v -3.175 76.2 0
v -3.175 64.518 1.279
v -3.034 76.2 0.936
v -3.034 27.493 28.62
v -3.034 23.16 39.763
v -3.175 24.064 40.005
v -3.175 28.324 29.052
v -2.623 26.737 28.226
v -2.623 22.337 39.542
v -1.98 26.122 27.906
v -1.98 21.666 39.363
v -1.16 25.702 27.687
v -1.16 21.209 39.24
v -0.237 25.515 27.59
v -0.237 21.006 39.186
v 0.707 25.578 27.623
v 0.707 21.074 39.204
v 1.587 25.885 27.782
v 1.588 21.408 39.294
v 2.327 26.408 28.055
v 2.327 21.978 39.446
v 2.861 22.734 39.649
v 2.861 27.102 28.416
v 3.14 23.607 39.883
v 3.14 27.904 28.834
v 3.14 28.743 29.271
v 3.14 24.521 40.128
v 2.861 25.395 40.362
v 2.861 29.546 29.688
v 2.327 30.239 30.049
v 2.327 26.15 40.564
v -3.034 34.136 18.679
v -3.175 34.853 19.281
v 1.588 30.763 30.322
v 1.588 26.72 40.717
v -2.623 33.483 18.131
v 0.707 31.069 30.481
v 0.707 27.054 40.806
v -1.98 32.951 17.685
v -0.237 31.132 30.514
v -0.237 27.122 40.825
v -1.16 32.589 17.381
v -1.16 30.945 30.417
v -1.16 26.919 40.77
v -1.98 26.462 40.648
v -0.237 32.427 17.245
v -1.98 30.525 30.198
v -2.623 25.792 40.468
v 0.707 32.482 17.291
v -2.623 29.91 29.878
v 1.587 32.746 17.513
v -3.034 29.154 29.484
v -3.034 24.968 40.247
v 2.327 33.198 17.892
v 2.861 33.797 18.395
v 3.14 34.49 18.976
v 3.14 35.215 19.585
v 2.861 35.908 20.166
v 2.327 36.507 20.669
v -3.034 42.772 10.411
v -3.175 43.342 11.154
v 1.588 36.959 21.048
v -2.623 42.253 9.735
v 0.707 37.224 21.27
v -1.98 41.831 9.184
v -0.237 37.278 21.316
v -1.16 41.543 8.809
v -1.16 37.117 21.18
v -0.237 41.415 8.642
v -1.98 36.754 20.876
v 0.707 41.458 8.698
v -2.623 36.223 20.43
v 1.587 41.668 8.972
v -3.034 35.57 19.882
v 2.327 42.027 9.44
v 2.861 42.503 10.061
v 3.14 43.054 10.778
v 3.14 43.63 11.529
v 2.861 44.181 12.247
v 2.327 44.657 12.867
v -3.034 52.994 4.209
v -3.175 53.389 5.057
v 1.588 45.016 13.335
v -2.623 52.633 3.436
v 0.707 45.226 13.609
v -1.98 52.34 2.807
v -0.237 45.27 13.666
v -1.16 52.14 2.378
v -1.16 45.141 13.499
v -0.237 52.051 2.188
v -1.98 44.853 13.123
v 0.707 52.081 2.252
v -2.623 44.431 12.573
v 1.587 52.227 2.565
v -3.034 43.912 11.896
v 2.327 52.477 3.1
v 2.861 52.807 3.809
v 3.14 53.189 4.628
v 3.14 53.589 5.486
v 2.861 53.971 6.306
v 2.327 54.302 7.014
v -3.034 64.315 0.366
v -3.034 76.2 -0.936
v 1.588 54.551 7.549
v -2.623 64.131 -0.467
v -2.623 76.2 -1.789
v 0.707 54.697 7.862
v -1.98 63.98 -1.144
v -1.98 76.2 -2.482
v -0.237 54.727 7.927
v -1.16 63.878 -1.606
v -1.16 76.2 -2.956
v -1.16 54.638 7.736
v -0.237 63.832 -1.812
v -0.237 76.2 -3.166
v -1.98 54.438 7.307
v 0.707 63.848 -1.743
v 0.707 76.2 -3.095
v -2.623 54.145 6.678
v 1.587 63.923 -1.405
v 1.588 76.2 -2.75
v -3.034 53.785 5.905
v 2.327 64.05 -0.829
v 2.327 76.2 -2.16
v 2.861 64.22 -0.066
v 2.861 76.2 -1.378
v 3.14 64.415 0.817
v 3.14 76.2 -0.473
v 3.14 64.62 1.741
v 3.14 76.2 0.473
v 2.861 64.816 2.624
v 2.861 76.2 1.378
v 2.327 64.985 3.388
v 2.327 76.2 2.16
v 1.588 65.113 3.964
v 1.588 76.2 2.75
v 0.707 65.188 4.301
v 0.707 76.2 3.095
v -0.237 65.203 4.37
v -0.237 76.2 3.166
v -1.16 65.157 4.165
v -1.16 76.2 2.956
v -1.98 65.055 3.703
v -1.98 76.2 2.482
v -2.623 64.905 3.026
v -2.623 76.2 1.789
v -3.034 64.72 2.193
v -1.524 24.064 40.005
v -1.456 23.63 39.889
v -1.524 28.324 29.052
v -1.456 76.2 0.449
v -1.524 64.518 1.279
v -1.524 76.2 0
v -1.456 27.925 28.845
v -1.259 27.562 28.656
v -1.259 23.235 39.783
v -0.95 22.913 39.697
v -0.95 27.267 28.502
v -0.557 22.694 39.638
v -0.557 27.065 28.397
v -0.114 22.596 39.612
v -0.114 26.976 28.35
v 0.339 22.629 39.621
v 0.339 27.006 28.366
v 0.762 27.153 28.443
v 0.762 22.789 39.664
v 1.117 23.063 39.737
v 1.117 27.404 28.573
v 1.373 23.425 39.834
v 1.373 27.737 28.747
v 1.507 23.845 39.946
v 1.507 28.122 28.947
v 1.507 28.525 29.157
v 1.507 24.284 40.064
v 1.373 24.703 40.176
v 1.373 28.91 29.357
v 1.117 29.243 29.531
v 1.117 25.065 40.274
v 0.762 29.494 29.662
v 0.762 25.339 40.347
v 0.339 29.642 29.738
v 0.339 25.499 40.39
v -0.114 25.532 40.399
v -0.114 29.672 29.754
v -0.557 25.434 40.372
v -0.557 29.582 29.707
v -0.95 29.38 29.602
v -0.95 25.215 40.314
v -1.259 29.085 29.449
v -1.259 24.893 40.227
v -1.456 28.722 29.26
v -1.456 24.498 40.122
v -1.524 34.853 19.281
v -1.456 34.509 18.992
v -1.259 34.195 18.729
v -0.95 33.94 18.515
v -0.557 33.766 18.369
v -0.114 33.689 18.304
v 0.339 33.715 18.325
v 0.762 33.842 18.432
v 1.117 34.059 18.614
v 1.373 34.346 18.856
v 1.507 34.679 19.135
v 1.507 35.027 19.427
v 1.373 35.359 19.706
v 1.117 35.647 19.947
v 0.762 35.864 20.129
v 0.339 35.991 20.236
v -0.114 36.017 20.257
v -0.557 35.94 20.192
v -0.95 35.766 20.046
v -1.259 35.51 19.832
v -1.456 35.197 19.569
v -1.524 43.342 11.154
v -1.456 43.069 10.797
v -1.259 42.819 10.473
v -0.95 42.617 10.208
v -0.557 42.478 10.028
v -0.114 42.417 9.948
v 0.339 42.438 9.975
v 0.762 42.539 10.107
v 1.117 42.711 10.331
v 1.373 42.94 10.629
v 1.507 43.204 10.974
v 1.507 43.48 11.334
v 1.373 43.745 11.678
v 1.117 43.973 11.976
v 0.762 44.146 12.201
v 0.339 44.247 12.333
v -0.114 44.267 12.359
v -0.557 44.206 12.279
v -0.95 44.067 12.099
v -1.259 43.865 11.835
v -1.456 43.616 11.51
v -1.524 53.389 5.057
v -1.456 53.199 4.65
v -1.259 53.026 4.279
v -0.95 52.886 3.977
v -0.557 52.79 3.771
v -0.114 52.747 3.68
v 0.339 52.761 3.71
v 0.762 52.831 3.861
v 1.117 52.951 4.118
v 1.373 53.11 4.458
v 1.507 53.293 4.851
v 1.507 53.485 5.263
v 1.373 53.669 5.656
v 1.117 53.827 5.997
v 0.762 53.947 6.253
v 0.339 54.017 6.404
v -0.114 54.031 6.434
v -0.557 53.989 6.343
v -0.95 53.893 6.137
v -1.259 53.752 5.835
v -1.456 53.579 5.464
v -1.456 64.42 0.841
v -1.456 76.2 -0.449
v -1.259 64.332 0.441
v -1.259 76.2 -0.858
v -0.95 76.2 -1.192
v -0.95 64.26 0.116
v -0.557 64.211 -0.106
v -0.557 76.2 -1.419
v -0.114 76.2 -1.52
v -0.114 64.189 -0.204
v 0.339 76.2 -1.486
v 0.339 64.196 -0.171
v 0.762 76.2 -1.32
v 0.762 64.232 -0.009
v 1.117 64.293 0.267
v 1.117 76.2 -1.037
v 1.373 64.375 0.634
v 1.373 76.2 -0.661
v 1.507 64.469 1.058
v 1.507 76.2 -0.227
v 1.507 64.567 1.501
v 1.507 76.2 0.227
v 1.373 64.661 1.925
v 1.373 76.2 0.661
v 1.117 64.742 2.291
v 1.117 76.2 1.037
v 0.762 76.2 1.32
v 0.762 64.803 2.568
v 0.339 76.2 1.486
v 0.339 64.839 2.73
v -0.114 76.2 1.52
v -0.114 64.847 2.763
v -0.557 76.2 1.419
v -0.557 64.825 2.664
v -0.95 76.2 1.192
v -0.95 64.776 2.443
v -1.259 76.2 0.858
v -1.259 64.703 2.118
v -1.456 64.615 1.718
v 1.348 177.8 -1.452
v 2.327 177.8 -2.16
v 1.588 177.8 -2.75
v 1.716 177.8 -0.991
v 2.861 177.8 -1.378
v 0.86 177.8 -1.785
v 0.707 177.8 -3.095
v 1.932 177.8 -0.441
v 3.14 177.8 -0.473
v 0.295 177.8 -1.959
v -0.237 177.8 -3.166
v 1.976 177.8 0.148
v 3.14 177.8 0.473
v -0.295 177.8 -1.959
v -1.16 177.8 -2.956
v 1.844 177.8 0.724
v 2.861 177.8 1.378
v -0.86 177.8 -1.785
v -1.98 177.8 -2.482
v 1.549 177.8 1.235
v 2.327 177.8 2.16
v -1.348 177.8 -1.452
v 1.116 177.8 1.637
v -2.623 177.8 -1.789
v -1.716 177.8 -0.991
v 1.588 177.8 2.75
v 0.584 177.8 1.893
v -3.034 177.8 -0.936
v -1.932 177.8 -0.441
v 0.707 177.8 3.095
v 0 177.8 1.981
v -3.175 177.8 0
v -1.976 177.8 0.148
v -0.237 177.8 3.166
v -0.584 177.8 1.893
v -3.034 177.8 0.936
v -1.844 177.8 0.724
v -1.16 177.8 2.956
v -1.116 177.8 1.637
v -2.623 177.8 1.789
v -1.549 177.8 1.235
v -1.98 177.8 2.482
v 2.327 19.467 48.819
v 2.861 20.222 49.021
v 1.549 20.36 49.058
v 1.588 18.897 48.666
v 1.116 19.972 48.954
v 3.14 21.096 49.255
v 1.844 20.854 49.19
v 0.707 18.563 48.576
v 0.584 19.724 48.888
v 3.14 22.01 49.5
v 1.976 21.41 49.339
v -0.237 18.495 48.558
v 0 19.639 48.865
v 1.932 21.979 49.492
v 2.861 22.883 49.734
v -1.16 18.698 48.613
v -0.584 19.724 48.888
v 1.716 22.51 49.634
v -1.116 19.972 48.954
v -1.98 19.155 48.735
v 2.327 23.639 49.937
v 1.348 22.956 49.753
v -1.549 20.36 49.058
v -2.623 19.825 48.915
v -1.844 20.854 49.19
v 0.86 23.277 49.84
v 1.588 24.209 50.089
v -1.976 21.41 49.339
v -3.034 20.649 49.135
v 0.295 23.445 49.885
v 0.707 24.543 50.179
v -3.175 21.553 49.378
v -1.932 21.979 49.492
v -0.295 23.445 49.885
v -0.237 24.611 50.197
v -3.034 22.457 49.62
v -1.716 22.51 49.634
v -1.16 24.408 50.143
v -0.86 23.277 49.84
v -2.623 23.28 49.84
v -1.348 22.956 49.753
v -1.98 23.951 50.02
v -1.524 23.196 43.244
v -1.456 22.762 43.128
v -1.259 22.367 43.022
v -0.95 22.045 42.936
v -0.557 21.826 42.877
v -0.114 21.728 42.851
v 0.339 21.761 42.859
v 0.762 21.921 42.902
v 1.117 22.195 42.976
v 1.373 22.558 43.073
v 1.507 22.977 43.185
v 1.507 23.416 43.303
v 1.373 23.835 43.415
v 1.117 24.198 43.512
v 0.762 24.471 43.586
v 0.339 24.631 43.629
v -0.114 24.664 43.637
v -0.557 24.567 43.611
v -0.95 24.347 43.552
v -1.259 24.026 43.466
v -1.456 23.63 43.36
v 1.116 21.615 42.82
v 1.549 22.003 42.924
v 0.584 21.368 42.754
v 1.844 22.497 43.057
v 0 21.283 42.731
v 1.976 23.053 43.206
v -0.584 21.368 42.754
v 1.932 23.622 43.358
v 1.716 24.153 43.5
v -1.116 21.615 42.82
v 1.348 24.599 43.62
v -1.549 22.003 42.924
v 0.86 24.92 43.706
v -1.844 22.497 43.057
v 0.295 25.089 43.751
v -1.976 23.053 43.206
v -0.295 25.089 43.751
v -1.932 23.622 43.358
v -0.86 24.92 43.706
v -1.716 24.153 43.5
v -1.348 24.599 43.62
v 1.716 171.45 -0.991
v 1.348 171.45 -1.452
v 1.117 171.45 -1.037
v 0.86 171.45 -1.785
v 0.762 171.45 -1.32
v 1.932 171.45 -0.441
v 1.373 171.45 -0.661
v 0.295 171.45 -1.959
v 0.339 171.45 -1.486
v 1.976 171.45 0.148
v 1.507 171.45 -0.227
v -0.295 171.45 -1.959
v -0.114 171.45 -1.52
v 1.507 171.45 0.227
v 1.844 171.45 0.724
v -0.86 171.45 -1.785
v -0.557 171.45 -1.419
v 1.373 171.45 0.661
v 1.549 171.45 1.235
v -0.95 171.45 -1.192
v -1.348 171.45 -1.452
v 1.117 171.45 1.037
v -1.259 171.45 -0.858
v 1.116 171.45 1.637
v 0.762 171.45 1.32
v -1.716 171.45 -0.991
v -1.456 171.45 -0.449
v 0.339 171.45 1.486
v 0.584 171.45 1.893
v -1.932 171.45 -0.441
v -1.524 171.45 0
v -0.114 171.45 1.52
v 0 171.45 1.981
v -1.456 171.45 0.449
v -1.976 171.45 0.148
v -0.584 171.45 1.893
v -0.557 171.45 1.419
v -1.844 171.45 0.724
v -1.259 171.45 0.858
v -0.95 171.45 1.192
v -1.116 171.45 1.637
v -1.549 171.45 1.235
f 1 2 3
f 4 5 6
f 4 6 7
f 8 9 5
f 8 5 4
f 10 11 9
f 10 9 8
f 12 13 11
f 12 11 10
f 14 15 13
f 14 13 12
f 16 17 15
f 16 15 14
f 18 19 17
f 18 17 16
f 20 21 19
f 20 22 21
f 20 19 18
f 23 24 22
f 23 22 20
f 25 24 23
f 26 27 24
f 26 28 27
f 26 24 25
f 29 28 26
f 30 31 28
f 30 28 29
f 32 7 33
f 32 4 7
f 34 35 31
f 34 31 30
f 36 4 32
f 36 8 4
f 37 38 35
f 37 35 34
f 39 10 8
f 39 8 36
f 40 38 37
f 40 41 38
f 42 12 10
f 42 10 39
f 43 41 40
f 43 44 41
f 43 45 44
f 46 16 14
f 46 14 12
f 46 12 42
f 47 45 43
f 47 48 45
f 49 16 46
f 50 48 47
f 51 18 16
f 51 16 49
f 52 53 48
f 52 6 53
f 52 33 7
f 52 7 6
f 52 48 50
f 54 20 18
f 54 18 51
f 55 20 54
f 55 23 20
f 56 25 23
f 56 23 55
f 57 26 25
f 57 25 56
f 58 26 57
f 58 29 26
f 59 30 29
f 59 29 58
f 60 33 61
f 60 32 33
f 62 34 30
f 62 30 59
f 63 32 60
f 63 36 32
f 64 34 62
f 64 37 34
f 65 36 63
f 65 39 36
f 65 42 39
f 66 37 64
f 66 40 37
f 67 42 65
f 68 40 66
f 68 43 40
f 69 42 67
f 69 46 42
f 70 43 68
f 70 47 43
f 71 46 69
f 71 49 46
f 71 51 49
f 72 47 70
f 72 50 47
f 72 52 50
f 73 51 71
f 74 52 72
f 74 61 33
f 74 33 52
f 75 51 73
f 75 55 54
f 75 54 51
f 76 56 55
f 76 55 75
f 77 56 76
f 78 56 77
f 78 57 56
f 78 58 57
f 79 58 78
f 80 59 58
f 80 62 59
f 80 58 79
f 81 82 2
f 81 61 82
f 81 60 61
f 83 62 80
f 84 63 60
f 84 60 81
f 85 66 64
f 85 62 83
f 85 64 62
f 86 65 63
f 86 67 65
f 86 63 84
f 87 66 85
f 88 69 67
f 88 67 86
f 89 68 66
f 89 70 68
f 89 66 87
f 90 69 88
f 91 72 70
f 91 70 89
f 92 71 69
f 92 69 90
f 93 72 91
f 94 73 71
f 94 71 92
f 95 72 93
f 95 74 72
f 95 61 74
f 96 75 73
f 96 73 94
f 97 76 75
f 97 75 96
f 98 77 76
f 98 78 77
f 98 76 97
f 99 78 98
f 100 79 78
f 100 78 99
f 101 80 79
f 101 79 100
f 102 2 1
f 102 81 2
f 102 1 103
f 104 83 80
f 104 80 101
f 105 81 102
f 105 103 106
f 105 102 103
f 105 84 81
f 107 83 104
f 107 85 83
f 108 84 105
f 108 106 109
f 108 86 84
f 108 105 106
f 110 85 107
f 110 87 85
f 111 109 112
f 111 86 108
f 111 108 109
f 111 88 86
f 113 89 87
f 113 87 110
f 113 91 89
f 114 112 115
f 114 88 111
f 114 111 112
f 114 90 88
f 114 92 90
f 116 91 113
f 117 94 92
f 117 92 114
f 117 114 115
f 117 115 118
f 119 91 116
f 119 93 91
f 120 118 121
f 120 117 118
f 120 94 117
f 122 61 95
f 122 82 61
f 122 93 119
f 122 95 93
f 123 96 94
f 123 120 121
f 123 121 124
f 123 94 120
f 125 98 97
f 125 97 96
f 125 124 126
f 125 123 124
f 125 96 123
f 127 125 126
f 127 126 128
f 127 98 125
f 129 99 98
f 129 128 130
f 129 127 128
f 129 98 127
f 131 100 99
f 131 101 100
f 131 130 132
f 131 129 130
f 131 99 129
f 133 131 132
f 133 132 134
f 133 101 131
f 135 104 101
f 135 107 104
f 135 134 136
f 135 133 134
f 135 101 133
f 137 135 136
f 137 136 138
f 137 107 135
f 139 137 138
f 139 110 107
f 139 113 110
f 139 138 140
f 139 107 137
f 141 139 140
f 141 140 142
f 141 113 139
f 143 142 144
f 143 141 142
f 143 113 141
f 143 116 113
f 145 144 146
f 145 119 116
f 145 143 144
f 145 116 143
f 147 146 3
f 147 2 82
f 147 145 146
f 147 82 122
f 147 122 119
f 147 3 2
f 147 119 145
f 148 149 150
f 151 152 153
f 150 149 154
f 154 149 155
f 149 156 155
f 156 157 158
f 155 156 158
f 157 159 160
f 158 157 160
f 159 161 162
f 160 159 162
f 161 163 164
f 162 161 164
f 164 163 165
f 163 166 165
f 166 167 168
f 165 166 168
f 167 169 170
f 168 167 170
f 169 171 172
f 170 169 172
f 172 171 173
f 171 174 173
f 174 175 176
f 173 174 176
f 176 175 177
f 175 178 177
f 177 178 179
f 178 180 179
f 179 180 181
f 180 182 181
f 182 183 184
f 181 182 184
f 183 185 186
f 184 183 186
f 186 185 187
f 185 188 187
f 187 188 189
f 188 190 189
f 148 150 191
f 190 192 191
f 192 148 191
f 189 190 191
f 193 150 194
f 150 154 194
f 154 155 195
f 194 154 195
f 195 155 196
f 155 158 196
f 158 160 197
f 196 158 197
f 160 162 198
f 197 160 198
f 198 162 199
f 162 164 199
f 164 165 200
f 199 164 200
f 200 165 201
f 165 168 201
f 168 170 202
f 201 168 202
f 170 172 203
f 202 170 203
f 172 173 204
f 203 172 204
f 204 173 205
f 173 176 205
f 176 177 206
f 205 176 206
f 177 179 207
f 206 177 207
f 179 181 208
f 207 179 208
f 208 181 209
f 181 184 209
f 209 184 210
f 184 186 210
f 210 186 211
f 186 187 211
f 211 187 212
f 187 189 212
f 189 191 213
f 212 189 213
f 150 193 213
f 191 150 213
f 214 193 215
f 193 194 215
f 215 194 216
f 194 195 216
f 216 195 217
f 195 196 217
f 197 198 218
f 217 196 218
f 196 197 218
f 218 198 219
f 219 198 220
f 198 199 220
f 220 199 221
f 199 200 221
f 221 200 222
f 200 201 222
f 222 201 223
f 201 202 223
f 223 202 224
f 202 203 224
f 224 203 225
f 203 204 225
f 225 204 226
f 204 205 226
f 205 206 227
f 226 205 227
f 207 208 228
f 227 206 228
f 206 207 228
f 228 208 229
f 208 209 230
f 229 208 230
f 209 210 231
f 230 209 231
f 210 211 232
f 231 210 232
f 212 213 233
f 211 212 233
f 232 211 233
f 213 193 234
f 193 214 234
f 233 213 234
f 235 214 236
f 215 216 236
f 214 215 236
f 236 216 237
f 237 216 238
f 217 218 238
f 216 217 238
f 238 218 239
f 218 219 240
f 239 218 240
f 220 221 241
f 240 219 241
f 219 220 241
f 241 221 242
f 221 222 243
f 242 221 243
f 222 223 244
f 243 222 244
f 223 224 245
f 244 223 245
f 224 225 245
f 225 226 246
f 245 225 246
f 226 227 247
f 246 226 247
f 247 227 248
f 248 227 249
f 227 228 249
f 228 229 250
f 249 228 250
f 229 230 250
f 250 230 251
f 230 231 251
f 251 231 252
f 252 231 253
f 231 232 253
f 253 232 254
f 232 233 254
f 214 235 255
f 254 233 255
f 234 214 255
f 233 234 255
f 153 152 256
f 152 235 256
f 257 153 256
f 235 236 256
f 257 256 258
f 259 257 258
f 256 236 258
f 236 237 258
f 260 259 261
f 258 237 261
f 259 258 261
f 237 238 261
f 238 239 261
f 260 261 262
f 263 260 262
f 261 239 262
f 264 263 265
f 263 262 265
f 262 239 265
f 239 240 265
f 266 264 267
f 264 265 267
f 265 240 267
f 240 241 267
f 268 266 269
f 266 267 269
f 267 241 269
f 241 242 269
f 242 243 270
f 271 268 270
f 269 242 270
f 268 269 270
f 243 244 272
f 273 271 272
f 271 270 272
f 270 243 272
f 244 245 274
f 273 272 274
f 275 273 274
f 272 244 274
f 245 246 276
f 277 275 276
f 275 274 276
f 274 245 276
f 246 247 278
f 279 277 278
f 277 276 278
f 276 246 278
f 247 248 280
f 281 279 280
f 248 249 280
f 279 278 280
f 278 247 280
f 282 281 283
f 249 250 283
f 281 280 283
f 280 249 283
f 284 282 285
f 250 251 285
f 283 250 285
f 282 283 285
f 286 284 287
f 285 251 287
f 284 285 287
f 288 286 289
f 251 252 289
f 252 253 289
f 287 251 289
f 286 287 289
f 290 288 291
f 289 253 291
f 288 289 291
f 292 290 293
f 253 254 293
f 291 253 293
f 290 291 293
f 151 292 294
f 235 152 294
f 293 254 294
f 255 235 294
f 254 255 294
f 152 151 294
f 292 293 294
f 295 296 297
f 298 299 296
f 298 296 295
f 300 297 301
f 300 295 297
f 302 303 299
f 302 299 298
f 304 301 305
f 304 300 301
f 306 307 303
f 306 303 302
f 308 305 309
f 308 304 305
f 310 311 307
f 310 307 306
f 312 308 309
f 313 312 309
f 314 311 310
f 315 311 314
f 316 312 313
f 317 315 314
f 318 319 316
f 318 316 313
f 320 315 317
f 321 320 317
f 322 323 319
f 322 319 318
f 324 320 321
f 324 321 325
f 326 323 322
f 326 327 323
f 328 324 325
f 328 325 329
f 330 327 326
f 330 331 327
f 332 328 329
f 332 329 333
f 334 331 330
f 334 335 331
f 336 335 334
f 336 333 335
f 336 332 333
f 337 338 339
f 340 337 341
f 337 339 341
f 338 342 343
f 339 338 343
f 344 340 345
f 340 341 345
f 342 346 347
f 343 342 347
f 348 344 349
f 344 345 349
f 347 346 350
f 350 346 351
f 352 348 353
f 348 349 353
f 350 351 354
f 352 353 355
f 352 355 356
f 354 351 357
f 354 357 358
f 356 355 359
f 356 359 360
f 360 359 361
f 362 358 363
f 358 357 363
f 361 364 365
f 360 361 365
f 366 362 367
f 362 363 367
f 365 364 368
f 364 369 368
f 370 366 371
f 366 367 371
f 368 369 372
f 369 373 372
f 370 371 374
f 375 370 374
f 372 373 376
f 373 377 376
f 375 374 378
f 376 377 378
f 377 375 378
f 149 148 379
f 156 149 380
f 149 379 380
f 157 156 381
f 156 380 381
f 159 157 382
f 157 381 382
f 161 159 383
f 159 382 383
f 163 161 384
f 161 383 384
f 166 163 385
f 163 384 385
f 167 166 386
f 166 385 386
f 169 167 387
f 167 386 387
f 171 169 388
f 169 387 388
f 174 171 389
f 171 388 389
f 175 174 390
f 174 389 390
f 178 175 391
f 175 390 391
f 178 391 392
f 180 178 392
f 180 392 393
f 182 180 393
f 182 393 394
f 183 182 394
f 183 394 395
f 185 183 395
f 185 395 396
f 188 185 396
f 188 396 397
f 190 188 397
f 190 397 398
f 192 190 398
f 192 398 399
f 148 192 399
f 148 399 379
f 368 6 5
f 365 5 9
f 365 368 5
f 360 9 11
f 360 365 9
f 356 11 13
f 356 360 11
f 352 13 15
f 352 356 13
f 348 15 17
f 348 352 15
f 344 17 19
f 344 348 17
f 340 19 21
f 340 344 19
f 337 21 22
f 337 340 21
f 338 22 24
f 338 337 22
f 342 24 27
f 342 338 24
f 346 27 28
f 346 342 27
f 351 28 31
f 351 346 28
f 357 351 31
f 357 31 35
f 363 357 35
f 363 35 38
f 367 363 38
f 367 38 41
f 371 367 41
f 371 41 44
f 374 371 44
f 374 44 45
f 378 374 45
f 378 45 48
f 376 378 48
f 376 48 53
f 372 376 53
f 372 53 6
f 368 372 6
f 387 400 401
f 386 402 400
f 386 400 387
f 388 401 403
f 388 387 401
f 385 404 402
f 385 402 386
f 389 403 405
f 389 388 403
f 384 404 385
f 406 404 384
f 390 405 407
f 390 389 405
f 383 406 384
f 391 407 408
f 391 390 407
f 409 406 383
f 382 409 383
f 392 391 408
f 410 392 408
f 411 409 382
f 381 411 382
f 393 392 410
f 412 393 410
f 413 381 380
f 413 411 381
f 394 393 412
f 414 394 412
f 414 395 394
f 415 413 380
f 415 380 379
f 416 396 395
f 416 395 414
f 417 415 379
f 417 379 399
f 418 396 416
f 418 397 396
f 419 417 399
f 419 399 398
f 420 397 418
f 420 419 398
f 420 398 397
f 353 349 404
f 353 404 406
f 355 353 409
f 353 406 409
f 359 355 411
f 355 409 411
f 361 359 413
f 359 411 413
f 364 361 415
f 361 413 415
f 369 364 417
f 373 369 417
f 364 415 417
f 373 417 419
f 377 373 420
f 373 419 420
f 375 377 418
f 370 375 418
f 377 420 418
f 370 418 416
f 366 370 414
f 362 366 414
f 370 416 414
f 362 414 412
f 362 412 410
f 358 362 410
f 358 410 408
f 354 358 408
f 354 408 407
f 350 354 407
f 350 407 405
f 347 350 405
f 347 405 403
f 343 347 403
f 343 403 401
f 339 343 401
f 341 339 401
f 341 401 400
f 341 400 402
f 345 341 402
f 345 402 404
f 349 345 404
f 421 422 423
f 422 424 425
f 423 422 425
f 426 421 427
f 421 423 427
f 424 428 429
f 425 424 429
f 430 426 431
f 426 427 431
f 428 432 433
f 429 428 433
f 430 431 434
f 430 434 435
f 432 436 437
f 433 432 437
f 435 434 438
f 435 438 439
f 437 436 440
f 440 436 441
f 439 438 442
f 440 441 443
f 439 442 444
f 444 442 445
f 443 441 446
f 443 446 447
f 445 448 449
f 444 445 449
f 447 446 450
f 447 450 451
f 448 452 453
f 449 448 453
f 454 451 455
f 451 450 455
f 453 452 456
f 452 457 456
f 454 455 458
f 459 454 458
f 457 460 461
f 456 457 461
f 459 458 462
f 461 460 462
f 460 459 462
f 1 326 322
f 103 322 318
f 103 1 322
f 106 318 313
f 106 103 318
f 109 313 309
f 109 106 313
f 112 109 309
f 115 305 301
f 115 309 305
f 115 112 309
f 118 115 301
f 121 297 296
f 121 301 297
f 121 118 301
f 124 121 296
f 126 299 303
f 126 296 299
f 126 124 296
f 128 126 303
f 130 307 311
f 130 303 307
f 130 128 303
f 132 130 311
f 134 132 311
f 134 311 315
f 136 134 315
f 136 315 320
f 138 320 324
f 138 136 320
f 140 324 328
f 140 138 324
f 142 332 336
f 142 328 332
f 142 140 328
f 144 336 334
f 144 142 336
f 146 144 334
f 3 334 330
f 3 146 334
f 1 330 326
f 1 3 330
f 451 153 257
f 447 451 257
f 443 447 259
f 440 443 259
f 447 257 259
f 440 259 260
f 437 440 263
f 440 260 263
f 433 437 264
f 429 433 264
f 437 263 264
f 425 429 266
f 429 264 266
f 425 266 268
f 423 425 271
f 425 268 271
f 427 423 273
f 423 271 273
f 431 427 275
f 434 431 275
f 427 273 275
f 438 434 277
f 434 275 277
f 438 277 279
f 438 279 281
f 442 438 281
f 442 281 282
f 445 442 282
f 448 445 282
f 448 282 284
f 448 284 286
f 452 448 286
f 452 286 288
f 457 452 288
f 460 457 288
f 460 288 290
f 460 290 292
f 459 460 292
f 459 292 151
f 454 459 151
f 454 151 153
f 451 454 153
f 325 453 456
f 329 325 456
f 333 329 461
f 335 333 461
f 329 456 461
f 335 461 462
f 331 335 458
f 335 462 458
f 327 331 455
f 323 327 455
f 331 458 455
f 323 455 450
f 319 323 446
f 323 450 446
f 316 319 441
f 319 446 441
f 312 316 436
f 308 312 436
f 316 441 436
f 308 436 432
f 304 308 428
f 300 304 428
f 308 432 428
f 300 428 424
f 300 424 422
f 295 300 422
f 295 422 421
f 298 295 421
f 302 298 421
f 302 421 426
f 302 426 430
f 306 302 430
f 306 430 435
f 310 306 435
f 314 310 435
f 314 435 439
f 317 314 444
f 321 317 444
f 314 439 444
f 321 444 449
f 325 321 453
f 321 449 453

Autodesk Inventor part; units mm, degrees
ref_plane "YZ Plane" through (0, 0, 0) normal (1, 0, 0) x (0, 1, 0)
ref_plane "XZ Plane" through (0, 0, 0) normal (0, 1, 0) x (-1, 0, 0)
sketch "Sketch1" plane through (0, 0, 0) normal (0, 1, 0) x (-1, 0, 0)
  circle A0 centre (0, 0) radius 3.175
  circle A1 centre (0, 0) radius 1.524
  dimension "d0" = 6.35
  dimension "d1" = 3.048
extrude "Extrusion1" add sketch "Sketch1" along normal blind 177.8
sketch "Sketch2" plane through (0, 177.8, 0) normal (0, 1, 0) x (1, 0, 0)
  point P0 (0, 0)
sketch "Sketch3" plane through (0, 177.8, 0) normal (0, 1, 0) x (1, 0, 0)
  point P0 (0, 0)
ref_plane "Work Plane1" through (0, 0, 3.175) normal (0, 0, 1) x (1, 0, 0)
sketch "Sketch4" plane through (0, 0, 3.175) normal (0, 0, 1) x (1, 0, 0)
  line L0 (-15.875, 25.4) -> (22.225, 25.4)
  line L1 (-15.8266, 76.2) -> (22.2734, 76.2)
  point P0 (0, 0)
  dimension "d4" = 38.1
  dimension "d5" = 25.4
  dimension "d6" = 38.1
  dimension "d7" = 76.2
bend part "Bend Part1" radius 50.8 angle 75 line through (-15.8266, 76.2, 3.175) along (1, 0, 0) centre toward (0, 0, 1) moving side (0, -1, 0) both sides no
hole "Hole1" at (0, 177.8, 0) direction (0, -1, 0) diameter 3.9624 depth 6.35 thread size "10-32 UNF" class "2B" standard "ANSI Unified Screw Threads"
sketch "Sketch8" plane through (0, 21.5528, 49.3776) normal (0, -0.258819, 0.9659258) x (1, 0, 0)
  circle A0 centre (0, 0) radius 3.175 projected
  circle A1 centre (0, 0) radius 1.524
  point P0 (0, -33.5983)
hole "Hole4" at (0, 21.5528, 49.3776) direction (0, 0.258819, -0.9659258) diameter 3.9624 depth 6.35 thread size "10-32 UNF" class "2B" standard "ANSI Unified Screw Threads"
properties part number "Stainless steel tube"
